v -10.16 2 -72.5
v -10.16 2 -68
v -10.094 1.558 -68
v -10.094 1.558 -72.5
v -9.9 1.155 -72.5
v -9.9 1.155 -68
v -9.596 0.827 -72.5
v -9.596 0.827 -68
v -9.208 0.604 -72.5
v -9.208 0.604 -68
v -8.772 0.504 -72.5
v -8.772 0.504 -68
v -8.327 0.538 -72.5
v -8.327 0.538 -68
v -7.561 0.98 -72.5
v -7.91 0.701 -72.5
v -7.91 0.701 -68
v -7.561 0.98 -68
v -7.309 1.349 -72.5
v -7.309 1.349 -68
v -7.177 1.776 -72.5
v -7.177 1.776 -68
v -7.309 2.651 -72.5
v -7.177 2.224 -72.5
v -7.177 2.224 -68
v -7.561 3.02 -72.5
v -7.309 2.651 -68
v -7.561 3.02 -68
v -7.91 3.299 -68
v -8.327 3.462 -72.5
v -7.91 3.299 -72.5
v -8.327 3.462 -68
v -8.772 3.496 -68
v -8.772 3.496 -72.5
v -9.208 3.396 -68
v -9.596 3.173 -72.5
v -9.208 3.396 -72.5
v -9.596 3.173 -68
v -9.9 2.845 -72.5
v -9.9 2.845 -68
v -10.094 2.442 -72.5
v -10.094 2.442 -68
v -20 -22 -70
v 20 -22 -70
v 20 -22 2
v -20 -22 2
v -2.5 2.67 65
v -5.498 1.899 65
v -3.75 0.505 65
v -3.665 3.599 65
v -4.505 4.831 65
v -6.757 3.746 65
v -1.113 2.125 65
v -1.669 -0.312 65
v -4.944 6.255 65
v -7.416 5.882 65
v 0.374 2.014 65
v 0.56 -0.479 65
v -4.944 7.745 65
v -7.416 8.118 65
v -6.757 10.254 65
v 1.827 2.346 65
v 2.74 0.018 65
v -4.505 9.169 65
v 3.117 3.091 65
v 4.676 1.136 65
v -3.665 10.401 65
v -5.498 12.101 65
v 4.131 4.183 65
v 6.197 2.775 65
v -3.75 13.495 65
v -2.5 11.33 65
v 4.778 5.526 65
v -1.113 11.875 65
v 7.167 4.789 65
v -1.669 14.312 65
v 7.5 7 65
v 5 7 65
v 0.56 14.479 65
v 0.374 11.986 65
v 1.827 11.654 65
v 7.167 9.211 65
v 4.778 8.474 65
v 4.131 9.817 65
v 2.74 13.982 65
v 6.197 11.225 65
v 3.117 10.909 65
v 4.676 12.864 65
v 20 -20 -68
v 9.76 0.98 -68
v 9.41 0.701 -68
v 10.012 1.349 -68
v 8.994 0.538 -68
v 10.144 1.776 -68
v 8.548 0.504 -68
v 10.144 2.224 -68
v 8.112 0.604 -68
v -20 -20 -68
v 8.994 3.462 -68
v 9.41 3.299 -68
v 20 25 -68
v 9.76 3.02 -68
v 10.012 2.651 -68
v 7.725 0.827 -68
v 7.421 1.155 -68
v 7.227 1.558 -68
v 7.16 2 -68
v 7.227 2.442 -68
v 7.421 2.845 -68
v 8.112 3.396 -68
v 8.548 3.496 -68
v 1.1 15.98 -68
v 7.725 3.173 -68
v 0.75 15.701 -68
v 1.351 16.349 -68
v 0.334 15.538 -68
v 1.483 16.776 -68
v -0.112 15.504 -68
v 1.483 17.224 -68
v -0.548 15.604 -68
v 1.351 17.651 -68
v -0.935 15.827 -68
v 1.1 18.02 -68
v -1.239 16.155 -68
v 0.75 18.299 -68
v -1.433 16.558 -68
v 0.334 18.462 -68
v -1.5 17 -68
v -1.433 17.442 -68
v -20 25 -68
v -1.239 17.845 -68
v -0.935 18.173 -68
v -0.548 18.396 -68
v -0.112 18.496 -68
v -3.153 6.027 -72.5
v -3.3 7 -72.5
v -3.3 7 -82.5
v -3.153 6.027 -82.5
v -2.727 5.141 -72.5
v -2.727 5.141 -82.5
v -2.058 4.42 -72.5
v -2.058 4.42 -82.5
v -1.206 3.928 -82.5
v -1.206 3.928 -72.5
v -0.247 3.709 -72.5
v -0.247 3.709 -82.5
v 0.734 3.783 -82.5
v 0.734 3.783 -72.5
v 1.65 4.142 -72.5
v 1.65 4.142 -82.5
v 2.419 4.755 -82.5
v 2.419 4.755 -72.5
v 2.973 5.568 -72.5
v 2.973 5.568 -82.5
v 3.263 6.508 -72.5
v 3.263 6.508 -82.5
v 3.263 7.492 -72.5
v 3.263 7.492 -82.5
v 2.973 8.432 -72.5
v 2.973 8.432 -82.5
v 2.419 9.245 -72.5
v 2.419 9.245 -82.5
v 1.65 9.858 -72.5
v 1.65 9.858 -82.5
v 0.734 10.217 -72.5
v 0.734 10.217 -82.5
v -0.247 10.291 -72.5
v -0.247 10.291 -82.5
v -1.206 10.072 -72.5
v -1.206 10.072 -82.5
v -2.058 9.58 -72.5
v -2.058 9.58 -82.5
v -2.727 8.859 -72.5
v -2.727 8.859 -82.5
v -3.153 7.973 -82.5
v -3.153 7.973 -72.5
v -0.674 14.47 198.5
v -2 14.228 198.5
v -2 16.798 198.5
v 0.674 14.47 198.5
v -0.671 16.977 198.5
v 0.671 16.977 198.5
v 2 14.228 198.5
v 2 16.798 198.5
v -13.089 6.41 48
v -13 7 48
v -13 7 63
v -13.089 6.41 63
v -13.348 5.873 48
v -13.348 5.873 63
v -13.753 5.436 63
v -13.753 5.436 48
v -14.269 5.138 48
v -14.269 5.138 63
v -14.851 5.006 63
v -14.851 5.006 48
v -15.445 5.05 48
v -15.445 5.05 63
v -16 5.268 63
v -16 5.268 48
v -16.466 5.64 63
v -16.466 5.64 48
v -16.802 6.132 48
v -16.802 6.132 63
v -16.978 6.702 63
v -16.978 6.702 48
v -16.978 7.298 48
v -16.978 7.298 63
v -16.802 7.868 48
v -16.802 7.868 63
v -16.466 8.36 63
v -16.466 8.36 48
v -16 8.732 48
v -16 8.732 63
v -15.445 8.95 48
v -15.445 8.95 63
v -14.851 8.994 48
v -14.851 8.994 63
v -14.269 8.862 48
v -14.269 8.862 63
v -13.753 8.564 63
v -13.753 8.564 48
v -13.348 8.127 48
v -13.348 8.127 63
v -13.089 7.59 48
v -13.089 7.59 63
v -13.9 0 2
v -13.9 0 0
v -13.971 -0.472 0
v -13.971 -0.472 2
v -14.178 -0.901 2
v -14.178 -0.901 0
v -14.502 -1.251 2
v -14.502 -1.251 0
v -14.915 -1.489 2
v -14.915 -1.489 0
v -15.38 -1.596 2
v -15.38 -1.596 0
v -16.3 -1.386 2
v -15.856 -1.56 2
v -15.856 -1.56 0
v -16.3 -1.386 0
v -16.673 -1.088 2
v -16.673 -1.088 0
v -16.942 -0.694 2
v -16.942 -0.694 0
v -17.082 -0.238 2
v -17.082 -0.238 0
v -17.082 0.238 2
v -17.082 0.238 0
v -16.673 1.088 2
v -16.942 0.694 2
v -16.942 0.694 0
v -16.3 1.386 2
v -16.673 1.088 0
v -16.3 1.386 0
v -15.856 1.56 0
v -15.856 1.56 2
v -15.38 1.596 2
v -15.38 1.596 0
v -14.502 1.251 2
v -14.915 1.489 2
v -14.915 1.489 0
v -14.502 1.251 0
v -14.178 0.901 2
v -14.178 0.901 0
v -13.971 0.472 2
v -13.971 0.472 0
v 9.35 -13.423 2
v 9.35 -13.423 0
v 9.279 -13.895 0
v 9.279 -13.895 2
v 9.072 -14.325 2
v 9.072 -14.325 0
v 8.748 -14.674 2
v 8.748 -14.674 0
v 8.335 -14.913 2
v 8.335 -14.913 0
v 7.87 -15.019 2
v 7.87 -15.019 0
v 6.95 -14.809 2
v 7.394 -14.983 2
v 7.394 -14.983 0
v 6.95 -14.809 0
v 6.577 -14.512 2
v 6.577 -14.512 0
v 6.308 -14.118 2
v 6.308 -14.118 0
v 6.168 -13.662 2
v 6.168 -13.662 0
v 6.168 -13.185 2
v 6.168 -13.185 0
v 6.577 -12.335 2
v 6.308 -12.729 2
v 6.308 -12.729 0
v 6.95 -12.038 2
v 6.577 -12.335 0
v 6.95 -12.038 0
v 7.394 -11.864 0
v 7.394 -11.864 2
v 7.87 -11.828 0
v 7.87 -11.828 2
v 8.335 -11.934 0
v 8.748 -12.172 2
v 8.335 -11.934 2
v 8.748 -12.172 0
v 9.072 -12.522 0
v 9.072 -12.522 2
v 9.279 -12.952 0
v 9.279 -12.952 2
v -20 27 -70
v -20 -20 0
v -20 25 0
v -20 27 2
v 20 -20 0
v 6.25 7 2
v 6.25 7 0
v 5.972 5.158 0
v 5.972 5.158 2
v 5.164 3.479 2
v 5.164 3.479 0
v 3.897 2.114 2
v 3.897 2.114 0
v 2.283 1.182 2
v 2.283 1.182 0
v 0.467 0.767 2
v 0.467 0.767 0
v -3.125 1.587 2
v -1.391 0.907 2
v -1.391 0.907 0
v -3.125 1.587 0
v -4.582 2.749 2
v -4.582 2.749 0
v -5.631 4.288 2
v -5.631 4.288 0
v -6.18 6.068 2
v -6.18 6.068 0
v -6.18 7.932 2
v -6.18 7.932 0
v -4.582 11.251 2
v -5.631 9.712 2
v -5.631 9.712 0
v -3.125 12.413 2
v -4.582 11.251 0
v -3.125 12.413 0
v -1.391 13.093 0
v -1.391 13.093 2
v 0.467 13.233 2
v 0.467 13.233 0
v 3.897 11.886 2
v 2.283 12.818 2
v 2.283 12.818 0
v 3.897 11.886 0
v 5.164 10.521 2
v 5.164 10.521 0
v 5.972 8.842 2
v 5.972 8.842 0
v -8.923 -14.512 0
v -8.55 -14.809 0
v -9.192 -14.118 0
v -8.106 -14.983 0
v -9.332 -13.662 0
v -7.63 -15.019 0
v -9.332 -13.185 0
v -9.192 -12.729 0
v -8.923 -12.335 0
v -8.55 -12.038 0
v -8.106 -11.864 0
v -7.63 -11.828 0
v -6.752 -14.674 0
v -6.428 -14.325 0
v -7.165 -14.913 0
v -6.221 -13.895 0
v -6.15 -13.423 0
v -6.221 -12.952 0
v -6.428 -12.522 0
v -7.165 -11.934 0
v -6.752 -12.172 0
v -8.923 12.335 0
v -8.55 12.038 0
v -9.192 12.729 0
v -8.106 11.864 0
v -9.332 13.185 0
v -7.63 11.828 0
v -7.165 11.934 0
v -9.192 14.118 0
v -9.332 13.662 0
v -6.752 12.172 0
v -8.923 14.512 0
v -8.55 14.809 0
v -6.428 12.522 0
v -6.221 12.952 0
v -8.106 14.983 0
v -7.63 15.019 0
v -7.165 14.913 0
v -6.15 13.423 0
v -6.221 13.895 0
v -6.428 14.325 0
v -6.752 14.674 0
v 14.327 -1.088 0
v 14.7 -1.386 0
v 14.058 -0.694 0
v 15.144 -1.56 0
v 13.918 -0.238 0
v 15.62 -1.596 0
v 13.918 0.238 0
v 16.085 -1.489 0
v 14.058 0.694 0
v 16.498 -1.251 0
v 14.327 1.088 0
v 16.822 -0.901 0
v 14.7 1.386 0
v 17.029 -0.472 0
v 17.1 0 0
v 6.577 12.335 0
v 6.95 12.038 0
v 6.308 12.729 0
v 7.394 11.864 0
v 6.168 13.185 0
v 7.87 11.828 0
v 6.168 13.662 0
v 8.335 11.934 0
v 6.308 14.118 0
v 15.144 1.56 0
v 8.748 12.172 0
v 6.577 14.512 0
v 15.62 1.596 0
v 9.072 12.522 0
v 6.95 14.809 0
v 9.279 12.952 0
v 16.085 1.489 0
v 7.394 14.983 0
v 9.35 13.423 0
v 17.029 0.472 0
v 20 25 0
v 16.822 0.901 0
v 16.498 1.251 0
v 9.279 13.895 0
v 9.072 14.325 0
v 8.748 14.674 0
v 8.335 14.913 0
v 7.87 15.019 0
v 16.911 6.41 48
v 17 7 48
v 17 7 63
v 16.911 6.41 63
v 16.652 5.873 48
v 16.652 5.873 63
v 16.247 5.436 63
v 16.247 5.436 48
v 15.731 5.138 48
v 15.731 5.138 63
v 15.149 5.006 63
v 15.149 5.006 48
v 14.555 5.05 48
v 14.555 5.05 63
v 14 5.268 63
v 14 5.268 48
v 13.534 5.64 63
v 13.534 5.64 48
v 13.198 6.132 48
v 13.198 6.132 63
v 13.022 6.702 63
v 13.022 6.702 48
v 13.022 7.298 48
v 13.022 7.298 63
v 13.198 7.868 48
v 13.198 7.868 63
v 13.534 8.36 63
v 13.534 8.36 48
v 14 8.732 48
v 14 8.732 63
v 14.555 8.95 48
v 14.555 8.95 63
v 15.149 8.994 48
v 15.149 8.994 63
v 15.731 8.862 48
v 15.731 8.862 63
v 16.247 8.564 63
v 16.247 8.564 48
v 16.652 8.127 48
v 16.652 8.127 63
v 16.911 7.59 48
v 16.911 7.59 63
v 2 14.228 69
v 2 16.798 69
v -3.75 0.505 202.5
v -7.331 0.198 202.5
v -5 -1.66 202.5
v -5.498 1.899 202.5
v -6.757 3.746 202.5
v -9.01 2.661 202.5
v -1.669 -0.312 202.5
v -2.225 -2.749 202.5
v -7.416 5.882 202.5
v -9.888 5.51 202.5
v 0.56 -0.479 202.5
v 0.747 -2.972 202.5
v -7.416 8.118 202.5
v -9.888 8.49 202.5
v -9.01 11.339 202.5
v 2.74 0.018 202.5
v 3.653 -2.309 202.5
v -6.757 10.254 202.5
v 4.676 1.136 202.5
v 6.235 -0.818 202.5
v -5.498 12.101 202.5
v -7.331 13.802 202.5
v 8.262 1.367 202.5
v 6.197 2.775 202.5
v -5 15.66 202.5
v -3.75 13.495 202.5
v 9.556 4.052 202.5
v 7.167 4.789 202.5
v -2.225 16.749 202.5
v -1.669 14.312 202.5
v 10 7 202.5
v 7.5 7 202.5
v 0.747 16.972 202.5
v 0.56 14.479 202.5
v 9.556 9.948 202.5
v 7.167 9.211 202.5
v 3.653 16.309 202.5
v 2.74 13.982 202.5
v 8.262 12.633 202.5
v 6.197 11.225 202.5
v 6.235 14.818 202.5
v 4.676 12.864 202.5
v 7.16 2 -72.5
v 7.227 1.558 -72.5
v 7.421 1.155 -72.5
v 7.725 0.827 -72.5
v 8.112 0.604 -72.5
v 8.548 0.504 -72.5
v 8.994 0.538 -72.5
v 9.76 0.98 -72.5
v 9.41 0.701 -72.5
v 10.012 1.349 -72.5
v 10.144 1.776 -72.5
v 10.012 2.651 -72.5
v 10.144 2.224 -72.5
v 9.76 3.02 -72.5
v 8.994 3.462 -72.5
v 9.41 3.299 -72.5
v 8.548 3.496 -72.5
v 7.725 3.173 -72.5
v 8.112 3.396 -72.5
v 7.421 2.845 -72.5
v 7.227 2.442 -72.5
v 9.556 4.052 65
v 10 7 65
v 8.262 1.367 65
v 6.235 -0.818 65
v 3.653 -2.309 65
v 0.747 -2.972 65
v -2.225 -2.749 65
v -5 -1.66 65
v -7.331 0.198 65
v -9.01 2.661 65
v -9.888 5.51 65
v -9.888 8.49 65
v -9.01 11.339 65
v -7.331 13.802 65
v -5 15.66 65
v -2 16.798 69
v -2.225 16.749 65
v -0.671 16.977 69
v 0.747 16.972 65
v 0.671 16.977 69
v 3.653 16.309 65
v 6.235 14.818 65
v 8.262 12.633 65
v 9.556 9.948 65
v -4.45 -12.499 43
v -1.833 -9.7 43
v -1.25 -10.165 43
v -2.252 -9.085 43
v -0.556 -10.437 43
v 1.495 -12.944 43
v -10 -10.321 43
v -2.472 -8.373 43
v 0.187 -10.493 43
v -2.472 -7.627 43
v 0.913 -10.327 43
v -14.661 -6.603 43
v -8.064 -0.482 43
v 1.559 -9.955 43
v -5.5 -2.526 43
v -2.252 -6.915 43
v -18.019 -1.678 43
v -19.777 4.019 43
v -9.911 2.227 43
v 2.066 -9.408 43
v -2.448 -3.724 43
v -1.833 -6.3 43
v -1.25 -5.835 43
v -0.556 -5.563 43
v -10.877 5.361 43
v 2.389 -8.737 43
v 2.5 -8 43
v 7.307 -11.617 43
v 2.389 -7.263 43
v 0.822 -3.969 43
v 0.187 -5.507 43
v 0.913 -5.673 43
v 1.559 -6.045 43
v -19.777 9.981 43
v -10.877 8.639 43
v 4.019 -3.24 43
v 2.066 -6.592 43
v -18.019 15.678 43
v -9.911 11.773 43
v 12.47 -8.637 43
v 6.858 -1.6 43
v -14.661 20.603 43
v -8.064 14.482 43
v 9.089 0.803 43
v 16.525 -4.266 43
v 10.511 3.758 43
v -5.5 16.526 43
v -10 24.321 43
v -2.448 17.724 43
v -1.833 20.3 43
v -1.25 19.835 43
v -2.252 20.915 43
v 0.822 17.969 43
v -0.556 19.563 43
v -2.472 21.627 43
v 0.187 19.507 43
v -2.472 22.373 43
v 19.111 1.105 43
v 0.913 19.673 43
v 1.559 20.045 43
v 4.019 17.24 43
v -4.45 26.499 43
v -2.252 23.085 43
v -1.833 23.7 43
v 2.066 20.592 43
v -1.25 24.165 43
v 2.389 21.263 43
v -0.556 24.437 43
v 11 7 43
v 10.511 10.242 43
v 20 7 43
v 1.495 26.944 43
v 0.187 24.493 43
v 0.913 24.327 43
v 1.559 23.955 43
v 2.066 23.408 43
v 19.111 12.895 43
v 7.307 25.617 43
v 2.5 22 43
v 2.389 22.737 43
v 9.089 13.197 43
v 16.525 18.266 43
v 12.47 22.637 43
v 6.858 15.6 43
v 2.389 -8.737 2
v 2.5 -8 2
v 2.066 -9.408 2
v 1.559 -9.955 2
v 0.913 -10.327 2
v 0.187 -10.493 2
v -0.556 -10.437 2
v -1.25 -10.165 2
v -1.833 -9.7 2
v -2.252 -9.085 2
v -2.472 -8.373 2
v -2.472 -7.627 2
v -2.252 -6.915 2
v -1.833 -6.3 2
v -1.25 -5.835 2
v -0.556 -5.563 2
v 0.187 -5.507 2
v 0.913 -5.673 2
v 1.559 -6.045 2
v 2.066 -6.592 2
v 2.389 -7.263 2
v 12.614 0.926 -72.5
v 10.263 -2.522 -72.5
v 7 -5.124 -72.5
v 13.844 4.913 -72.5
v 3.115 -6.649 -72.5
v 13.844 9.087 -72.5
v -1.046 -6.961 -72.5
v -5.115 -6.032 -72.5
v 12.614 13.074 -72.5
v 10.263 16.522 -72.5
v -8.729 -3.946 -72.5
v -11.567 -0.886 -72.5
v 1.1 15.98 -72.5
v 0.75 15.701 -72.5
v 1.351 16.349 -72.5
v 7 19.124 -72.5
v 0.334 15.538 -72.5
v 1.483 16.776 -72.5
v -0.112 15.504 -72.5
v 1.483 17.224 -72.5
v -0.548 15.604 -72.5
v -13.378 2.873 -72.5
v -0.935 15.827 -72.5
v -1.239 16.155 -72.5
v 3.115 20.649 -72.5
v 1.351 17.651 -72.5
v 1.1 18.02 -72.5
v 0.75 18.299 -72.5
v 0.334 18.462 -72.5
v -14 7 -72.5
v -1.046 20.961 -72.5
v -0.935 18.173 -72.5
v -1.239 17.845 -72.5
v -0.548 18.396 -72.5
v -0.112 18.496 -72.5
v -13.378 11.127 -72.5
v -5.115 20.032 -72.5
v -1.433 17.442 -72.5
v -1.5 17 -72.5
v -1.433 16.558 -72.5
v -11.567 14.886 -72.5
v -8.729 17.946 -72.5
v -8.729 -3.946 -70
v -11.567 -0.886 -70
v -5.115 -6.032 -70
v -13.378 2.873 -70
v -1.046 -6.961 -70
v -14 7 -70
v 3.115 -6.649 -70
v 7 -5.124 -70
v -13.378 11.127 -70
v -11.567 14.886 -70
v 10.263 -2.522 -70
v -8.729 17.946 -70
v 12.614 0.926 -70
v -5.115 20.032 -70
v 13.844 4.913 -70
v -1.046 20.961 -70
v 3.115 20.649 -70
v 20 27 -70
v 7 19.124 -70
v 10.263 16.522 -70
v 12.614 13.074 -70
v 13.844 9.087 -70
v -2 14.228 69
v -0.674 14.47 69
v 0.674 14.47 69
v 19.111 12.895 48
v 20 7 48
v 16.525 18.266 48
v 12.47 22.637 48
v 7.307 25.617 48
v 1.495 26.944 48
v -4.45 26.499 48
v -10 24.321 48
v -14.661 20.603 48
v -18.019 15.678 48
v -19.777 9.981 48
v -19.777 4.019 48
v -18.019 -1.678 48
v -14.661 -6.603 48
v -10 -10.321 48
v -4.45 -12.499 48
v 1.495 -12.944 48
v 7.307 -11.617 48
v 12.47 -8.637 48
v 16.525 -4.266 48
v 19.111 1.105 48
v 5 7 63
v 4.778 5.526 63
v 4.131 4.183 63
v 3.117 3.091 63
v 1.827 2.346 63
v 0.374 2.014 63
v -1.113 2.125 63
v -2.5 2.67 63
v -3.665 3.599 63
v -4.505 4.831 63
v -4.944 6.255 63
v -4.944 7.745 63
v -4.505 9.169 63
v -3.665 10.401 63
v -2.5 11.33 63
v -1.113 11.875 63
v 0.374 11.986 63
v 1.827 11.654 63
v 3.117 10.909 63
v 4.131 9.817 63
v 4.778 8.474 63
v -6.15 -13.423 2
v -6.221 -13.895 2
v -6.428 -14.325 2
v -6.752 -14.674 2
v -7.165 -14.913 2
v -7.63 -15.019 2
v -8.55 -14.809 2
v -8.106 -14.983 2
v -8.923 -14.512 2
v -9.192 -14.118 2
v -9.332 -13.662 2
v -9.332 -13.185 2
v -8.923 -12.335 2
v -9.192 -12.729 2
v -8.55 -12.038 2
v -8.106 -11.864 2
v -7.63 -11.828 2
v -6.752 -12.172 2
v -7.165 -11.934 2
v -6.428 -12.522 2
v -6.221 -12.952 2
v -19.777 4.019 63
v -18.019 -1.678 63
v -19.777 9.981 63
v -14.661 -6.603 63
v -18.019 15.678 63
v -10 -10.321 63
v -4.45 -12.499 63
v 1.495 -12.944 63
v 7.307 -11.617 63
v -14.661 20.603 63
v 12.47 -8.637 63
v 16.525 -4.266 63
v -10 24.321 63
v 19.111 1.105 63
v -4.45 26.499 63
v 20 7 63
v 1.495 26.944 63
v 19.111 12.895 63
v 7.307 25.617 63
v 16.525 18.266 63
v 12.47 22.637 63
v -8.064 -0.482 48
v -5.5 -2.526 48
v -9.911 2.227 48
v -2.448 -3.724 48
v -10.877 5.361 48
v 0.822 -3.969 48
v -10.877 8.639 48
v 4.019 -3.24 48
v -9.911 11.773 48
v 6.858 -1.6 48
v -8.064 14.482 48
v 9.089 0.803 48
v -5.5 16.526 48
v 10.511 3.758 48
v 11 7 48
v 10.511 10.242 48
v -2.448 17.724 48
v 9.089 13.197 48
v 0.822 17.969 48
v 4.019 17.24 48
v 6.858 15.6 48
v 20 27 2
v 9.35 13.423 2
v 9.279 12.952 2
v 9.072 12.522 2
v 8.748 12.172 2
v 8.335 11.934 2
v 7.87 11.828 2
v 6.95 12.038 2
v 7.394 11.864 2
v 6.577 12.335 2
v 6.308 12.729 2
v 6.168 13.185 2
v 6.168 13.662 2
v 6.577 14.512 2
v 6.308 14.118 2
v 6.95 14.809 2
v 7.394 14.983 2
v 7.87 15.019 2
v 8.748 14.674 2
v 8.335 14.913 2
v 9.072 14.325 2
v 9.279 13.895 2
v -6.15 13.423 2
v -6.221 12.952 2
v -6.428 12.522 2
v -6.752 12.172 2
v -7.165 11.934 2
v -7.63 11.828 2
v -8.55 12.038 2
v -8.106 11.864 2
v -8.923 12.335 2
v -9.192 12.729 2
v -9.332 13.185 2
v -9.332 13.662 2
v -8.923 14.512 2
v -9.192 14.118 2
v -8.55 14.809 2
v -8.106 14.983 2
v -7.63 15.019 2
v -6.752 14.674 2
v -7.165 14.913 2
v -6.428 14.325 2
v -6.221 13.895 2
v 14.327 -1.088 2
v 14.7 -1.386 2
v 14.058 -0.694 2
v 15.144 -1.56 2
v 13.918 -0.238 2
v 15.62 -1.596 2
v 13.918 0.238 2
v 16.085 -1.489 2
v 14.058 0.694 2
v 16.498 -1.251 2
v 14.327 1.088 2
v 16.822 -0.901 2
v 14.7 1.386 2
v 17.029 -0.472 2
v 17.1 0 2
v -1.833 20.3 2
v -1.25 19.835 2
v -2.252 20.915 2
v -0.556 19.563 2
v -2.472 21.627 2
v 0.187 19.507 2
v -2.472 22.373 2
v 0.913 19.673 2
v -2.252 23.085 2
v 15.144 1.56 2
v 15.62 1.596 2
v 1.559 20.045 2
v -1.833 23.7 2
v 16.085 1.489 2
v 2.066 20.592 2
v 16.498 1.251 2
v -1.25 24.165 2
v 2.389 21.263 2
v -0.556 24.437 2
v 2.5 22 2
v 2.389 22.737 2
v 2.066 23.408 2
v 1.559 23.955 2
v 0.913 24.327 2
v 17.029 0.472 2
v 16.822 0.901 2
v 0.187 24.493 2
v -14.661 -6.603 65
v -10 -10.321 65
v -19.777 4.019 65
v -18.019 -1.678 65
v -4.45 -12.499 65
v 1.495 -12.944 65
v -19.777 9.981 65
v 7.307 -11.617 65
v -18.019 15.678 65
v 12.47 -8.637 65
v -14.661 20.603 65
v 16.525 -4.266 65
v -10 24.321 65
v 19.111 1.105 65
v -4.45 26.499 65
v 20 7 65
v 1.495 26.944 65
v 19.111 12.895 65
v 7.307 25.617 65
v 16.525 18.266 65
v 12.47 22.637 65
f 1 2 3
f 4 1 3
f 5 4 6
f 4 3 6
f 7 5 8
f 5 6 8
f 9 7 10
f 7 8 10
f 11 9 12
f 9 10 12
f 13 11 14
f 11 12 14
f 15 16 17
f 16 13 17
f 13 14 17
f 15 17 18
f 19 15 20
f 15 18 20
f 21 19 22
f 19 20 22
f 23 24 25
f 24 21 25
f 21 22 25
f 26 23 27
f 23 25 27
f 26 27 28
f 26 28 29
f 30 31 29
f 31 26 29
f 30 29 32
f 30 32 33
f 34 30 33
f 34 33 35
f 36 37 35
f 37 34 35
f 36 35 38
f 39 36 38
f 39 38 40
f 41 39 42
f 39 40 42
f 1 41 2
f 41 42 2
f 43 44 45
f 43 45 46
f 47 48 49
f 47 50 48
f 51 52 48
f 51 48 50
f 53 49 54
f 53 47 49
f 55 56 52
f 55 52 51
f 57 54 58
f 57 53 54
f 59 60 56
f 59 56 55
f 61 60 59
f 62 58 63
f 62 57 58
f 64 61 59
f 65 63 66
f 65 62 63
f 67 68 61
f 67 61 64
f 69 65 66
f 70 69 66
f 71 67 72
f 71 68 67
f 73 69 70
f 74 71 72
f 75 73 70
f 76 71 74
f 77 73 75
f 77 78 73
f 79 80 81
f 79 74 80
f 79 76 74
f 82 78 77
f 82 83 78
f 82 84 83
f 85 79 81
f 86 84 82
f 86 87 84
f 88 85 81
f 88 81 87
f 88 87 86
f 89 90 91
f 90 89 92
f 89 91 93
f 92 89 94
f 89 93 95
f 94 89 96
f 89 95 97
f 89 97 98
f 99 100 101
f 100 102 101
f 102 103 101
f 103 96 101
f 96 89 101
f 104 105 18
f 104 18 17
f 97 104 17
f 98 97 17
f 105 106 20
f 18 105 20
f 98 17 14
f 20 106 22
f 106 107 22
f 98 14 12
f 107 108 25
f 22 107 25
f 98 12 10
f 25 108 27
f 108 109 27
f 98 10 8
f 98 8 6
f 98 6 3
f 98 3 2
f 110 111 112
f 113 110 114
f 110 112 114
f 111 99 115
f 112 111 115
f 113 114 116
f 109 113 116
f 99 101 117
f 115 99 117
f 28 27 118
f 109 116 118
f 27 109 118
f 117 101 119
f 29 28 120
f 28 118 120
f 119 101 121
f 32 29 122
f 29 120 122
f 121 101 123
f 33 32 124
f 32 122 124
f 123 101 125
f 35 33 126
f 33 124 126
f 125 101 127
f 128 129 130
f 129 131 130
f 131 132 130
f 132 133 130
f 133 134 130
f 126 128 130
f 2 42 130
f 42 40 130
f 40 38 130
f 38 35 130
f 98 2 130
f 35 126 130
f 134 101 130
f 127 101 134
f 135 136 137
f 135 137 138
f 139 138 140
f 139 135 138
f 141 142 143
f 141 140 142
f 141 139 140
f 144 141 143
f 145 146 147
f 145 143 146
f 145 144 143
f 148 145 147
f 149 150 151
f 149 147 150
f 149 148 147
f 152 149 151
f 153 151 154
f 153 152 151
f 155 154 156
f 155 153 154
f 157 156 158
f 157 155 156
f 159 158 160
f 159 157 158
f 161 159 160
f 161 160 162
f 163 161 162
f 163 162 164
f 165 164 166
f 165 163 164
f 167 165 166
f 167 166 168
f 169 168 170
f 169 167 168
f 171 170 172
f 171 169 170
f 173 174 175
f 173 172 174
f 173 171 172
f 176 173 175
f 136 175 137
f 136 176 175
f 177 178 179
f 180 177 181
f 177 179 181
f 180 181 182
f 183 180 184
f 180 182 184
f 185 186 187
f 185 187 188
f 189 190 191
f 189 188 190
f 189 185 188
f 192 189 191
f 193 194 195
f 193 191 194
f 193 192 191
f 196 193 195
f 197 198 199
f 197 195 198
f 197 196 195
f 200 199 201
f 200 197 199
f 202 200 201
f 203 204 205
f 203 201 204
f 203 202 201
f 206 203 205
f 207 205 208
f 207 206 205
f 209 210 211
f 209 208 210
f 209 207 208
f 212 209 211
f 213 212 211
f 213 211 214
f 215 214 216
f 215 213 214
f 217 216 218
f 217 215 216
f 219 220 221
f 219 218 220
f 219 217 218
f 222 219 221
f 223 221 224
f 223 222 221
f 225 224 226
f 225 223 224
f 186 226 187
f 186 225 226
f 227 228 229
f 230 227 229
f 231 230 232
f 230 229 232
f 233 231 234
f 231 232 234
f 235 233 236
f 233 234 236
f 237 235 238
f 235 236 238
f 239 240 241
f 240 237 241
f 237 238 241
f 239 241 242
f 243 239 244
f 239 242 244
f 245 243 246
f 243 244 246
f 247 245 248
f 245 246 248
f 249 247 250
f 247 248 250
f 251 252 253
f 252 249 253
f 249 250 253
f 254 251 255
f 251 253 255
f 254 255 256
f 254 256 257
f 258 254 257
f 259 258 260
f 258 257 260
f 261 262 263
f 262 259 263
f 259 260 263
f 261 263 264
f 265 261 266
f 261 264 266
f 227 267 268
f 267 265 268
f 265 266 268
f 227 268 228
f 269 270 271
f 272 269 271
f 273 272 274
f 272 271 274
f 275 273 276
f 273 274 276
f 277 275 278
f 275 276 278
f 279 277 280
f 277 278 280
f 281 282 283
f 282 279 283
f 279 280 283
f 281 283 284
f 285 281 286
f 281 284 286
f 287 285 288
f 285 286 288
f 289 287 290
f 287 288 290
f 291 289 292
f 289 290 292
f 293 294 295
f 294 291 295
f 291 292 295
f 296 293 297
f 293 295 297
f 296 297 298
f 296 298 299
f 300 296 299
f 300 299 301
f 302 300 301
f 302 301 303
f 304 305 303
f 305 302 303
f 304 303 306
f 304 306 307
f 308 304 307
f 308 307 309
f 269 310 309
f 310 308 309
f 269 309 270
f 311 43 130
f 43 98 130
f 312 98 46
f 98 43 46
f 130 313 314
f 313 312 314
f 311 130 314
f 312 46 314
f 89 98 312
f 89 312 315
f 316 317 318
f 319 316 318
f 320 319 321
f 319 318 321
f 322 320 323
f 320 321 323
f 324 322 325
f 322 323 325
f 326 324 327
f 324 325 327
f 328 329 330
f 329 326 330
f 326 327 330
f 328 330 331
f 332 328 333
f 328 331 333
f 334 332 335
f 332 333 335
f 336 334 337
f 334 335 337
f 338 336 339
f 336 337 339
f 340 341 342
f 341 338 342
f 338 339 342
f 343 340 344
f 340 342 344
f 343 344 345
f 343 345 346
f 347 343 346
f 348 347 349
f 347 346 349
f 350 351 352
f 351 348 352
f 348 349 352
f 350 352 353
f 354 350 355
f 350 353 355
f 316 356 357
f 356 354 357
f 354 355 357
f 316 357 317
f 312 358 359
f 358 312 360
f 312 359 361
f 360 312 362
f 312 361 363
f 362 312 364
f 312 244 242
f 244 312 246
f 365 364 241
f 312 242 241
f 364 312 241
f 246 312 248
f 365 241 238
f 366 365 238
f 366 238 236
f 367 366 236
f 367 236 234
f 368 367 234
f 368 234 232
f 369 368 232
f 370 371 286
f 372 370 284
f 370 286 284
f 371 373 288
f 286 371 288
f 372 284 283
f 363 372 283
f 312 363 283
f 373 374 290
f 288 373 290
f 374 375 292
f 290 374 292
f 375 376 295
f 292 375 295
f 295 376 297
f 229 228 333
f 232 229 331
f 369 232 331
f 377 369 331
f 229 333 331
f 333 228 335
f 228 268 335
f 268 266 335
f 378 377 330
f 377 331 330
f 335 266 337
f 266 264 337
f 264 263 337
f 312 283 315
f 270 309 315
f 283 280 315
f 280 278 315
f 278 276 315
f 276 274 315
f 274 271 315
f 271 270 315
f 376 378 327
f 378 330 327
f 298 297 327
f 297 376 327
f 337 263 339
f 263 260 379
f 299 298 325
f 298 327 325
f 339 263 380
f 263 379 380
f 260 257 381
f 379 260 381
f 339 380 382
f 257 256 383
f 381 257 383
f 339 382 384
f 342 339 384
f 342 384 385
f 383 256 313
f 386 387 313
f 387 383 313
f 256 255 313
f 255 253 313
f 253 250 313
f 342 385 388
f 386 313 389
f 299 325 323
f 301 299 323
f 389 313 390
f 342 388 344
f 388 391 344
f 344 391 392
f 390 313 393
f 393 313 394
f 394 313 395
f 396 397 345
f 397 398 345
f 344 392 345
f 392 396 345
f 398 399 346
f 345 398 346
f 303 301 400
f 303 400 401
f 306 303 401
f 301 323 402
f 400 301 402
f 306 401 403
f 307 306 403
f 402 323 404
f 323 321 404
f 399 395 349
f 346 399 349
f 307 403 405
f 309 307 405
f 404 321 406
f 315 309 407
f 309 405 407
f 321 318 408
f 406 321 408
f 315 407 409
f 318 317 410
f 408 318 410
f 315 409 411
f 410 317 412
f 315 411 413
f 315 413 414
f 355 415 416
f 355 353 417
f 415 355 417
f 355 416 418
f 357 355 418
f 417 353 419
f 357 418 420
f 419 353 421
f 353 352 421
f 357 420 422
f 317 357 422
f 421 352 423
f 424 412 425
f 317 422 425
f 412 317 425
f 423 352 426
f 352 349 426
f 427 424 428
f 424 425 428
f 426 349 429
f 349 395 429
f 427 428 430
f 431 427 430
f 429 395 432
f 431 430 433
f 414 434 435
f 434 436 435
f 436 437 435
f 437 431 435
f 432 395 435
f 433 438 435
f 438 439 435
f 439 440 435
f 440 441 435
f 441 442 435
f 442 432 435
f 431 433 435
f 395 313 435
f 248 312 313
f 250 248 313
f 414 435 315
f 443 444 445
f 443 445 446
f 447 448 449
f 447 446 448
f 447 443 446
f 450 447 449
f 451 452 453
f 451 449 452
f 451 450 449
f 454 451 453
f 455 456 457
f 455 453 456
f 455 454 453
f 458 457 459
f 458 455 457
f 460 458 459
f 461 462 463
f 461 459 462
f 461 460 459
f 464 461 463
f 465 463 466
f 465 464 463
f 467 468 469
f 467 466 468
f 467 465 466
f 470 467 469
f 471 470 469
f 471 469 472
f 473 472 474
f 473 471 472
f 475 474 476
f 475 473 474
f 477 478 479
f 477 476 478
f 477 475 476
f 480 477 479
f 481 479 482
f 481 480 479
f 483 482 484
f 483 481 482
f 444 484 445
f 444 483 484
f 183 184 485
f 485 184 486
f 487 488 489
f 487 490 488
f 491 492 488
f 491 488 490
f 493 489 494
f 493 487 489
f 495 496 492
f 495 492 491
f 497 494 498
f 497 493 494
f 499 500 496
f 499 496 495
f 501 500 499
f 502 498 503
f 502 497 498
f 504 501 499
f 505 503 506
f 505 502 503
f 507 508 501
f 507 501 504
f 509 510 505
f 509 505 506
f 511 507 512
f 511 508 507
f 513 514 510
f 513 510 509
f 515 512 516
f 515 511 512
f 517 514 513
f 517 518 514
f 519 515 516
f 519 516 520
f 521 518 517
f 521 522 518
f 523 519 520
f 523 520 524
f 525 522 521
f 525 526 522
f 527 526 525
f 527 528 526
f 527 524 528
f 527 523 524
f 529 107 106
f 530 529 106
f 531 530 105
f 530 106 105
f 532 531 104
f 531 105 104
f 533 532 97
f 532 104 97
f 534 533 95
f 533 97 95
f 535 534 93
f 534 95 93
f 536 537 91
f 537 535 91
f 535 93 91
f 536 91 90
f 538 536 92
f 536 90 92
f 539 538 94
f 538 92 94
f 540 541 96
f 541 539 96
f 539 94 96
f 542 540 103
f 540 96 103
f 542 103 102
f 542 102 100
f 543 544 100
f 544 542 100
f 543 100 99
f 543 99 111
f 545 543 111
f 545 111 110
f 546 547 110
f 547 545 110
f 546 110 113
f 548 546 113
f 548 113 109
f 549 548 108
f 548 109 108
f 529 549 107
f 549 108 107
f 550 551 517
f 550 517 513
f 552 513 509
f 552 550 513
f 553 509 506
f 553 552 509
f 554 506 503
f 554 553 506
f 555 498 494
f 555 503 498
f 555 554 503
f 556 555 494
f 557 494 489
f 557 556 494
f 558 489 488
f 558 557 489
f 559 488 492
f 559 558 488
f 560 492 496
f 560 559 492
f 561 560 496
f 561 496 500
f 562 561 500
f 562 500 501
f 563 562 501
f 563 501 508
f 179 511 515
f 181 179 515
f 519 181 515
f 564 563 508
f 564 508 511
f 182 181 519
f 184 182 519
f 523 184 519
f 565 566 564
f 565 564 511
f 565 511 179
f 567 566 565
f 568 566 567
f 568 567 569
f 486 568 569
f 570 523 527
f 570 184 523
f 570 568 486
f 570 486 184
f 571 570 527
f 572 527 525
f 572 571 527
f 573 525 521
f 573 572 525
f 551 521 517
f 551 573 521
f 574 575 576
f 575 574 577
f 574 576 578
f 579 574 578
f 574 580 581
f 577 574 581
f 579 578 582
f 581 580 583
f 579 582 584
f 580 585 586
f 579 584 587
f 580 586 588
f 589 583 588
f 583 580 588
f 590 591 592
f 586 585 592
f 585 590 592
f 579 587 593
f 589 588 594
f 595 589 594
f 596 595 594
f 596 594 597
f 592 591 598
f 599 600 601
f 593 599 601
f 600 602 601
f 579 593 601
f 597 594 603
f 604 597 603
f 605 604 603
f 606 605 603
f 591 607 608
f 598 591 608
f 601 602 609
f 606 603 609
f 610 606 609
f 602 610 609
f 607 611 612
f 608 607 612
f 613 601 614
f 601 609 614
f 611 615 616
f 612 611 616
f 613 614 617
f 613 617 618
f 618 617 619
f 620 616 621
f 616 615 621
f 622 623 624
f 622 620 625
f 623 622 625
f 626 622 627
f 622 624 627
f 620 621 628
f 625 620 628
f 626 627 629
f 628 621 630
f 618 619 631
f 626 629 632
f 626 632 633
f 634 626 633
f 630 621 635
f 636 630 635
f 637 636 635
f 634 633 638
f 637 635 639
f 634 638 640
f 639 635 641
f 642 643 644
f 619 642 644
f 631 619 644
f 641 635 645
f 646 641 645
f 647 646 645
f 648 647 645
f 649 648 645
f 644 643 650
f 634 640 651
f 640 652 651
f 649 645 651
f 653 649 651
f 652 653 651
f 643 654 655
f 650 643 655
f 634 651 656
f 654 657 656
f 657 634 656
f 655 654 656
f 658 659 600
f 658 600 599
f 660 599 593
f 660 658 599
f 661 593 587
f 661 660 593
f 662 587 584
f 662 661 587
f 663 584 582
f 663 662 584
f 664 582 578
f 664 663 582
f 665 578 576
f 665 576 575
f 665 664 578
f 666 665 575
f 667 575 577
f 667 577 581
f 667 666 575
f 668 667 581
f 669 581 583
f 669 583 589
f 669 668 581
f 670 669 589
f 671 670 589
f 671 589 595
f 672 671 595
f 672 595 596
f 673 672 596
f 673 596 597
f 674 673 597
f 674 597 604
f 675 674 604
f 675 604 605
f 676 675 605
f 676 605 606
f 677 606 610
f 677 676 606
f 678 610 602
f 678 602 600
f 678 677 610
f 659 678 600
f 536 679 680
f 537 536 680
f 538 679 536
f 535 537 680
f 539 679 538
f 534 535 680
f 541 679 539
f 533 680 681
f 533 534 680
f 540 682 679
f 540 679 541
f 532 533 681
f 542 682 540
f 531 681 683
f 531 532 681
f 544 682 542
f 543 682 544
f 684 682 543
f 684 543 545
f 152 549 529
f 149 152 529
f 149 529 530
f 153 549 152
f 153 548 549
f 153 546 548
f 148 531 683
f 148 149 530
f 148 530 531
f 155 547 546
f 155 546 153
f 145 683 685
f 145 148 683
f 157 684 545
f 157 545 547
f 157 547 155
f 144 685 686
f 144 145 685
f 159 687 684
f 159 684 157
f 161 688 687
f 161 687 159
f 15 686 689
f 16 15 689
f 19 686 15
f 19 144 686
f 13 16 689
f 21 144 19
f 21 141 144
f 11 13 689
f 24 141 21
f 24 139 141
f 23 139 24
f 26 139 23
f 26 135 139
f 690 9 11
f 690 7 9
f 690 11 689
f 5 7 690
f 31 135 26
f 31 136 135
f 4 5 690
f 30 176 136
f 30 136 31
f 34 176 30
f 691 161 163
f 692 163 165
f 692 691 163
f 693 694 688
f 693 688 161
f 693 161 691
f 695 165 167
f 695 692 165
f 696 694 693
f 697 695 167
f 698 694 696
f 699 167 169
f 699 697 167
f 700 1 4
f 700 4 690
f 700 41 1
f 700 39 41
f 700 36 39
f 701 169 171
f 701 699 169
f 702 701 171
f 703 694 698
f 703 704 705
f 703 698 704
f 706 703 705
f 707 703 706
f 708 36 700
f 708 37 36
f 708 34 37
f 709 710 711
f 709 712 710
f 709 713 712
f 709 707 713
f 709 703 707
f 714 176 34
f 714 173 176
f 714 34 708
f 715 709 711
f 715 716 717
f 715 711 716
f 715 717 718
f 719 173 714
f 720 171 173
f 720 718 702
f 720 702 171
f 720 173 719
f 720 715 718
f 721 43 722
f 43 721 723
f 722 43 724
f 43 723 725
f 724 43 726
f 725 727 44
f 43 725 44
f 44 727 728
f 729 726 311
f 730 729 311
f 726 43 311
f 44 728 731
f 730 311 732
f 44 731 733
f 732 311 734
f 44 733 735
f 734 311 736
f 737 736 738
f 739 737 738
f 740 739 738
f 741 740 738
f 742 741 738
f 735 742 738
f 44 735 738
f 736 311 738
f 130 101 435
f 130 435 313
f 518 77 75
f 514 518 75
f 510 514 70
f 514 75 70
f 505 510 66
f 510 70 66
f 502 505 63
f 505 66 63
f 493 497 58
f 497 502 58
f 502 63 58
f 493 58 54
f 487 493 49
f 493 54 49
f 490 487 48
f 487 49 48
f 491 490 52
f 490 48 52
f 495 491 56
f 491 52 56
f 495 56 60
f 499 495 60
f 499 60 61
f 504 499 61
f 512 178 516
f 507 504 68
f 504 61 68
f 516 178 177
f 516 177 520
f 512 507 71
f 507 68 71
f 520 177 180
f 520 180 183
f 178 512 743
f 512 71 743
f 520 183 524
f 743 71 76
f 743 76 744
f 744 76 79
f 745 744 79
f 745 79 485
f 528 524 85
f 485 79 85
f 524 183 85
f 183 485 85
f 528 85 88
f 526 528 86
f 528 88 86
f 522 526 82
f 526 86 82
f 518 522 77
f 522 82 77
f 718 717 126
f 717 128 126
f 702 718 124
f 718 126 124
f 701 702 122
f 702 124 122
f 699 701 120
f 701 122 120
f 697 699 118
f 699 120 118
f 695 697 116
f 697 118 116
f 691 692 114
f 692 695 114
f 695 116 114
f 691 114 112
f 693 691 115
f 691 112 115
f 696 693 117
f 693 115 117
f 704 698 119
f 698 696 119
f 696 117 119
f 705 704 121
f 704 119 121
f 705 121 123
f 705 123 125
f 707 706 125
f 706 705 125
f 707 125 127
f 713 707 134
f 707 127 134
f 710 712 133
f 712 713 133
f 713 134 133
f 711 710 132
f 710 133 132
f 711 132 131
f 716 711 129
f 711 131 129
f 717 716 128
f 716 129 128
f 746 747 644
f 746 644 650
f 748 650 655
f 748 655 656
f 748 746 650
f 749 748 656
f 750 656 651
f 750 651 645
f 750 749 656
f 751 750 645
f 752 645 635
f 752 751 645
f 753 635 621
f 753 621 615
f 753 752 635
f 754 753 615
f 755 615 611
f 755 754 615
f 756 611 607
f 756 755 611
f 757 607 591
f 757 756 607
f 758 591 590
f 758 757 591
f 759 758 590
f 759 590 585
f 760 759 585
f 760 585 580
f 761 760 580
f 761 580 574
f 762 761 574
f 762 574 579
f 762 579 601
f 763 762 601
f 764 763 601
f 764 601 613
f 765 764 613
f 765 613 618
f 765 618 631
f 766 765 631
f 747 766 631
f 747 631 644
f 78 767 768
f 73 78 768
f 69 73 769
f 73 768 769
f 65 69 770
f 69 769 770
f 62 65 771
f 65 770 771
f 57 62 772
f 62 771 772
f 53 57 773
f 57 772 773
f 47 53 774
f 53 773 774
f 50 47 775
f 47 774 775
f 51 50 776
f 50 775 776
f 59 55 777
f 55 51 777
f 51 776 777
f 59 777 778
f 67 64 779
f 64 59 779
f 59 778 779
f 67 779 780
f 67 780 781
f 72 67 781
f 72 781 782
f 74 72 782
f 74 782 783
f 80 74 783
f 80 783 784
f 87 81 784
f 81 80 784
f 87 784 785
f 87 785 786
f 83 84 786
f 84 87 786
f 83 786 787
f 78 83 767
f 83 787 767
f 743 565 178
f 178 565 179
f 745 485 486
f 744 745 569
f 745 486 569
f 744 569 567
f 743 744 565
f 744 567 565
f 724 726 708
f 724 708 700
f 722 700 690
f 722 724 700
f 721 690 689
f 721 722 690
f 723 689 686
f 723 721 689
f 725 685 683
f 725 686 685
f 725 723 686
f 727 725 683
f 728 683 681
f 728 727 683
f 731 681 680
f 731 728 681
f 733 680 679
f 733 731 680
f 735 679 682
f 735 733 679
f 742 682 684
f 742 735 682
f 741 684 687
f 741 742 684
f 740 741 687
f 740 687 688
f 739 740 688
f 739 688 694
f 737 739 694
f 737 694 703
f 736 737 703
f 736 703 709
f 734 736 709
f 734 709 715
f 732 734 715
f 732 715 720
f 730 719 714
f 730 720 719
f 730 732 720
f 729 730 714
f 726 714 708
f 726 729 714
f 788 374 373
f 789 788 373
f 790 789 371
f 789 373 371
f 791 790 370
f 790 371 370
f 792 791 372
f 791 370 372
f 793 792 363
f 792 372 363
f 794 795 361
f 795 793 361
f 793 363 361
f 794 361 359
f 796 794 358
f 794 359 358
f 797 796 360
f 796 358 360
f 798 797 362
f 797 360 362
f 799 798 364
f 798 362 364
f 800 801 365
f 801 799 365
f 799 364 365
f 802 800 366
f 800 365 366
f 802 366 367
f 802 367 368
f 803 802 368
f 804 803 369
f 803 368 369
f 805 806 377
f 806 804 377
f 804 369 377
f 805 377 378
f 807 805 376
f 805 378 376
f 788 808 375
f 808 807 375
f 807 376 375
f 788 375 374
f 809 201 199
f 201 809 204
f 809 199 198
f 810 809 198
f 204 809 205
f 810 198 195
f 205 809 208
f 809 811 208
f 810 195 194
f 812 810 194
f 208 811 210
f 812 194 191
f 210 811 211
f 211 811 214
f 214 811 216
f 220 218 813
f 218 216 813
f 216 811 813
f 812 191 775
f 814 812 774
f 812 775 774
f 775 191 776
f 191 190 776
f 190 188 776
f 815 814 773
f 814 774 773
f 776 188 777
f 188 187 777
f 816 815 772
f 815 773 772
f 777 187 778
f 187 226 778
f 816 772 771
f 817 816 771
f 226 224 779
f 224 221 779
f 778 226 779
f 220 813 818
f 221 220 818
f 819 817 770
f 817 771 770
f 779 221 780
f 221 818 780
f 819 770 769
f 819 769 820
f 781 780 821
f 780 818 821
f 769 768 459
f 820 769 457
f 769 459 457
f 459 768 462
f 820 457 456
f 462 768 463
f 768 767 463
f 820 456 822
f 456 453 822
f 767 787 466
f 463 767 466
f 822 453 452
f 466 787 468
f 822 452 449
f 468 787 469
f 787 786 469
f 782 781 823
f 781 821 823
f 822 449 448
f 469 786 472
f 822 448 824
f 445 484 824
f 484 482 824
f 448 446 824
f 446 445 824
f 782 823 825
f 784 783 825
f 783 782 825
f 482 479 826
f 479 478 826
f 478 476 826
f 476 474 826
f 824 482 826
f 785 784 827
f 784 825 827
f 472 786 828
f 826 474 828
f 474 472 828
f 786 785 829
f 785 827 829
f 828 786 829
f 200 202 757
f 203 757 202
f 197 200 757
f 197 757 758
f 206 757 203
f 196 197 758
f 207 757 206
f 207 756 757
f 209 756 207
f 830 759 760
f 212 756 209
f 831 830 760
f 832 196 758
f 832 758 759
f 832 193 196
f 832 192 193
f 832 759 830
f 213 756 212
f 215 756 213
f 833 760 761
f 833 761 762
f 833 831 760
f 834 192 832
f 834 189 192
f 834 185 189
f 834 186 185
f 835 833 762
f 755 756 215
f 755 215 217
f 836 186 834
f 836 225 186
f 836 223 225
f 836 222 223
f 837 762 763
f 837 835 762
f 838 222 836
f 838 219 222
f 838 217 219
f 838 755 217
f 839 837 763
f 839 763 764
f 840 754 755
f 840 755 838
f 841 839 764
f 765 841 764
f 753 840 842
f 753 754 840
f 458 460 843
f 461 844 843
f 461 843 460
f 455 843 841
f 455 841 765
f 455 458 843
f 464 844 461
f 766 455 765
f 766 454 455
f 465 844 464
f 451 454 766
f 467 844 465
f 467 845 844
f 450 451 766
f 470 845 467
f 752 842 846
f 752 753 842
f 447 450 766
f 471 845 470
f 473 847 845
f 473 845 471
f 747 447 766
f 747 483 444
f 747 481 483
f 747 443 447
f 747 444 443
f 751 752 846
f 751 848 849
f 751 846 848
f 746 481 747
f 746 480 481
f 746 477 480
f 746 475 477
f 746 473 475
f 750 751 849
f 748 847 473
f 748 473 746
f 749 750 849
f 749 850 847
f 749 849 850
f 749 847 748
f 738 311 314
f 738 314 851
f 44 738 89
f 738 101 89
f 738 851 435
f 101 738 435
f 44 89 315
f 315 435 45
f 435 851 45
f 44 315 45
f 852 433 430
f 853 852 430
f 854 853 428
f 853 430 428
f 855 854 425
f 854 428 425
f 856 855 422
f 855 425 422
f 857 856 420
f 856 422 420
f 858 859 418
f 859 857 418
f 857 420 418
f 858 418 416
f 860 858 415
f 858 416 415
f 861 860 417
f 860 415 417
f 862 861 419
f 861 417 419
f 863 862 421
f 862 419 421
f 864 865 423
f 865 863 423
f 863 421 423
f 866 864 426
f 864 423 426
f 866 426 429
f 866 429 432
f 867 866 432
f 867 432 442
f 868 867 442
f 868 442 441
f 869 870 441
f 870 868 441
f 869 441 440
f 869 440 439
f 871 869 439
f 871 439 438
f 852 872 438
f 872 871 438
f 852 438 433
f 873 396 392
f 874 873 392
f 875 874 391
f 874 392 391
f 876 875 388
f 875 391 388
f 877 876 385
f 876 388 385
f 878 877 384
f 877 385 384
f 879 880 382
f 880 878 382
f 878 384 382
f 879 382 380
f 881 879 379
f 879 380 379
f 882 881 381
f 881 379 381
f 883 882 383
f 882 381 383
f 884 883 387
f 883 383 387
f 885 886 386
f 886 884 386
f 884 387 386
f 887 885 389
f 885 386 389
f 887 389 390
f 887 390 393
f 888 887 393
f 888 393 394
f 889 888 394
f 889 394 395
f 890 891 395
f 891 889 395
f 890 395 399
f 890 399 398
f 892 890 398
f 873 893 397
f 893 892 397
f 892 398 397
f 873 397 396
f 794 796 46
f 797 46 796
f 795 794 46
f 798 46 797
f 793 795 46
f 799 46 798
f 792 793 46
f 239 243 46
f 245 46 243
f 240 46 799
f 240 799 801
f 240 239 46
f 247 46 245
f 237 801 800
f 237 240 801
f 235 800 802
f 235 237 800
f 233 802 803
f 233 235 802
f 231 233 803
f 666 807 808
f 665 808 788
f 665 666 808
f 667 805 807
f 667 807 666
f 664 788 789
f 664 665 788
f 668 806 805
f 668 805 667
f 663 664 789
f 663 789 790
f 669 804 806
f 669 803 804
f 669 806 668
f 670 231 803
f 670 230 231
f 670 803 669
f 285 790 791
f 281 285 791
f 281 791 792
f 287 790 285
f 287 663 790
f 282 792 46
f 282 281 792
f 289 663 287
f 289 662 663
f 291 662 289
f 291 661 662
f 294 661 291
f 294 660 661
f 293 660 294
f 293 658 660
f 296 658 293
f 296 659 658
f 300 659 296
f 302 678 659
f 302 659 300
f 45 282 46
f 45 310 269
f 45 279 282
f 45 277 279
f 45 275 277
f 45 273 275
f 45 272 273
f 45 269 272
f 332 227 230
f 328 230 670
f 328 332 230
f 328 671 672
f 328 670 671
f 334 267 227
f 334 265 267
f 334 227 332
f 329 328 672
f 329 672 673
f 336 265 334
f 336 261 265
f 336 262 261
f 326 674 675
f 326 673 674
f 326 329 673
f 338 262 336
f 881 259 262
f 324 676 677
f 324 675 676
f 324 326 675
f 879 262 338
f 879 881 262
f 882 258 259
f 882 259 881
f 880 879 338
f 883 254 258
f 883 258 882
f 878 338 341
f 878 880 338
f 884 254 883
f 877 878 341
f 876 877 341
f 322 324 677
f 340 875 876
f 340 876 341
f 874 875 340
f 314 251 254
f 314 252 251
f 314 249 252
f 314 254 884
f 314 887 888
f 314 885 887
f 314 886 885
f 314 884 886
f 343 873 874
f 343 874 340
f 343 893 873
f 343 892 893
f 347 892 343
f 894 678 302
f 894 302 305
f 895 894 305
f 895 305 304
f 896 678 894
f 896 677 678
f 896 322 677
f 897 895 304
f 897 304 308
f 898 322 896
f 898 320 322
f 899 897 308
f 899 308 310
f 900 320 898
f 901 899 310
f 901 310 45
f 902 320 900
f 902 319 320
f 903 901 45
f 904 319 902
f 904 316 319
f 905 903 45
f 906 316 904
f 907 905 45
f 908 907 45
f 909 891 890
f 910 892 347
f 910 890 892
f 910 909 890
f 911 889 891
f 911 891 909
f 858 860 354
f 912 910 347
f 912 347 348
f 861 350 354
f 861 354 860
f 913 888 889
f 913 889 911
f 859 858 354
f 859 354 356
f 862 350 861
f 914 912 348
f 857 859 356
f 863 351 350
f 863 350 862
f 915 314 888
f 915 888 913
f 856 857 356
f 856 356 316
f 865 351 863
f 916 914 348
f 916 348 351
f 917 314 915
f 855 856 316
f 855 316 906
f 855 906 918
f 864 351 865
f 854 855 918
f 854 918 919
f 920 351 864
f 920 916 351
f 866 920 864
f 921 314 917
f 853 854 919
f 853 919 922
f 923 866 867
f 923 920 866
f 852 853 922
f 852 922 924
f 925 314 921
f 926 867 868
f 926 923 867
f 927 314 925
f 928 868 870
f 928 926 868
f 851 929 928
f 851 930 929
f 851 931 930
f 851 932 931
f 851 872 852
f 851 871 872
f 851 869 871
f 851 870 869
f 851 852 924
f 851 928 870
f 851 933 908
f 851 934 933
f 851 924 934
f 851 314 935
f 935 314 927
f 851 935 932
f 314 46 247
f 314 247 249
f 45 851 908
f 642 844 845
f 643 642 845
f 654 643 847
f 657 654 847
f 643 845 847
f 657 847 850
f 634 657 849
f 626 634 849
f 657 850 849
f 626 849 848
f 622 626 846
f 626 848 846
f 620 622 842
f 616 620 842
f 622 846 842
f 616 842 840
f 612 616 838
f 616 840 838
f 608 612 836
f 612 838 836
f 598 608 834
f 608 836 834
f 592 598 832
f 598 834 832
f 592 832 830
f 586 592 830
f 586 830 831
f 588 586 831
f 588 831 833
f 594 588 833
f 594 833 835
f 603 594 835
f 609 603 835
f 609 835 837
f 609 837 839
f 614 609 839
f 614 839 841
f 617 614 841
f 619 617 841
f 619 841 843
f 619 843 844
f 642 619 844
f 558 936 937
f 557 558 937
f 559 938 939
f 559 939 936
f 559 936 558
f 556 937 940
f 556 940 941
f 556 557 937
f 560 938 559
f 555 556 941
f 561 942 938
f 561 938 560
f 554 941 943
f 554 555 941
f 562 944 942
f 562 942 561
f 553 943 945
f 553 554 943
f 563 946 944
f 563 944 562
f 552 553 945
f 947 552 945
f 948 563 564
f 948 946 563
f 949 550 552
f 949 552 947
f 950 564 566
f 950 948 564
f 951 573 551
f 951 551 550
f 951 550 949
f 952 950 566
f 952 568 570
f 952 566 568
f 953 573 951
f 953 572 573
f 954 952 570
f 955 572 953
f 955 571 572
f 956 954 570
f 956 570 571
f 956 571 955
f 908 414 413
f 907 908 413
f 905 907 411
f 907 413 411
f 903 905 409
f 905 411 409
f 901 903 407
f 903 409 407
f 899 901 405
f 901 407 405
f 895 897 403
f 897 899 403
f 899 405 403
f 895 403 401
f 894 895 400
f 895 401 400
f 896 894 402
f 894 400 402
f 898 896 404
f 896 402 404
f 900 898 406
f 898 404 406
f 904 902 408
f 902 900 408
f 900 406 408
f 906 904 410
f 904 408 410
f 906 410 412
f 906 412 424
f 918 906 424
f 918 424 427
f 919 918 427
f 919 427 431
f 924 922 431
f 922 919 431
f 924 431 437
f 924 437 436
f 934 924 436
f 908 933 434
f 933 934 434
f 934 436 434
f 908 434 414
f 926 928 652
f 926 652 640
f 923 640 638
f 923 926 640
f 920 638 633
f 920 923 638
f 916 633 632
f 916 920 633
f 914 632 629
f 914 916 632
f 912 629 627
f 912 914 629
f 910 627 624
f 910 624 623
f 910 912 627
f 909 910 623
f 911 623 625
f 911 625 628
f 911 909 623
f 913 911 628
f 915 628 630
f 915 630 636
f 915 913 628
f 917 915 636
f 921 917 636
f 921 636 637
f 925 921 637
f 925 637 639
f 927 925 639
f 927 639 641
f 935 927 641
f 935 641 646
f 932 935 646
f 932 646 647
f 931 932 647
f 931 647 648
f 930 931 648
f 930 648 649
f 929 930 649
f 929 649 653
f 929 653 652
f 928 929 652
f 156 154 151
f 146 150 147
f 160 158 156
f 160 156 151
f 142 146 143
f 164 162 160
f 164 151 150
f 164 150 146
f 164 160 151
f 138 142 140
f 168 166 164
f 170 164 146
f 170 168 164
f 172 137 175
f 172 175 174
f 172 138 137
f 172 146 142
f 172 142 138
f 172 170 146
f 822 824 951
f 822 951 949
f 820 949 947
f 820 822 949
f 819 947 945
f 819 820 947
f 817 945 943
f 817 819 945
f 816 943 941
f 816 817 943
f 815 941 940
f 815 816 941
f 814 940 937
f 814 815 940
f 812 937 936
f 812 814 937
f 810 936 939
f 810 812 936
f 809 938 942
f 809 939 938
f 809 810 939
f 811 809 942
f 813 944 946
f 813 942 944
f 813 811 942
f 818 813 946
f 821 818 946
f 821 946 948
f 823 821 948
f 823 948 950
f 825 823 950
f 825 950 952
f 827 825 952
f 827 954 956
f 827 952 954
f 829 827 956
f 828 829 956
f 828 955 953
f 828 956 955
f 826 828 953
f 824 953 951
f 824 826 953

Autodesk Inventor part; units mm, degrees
ref_plane "YZ Plane" through (0, 0, 0) normal (1, 0, 0) x (0, 1, 0)
ref_plane "XZ Plane" through (0, 0, 0) normal (0, 1, 0) x (-1, 0, 0)
sketch "Sketch1" plane through (0, 0, 0) normal (0, 0, 1) x (1, 0, 0)
  circle A0 centre (0, 0) radius 18.5 projected
  arc A1 (-8.9075, 7.6329) -> (8.9075, 7.6329) centre (0, 7) ccw projected
  spline S0 degree 3 poles (8.9075, 7.6329) (8.9044, 7.6769) (8.9082, 7.7215) (8.9387, 7.8037) (8.9677, 7.8415) (9.0503, 7.8747) (9.0975, 7.8677) (9.1766, 7.8302) (9.2105, 7.8009) (9.2388, 7.7672) knots 0 0 0 0 0.25 0.25 0.5 0.5 0.75 0.75 1 1 1 1 projected
  arc A2 (-9.2388, 7.7672) -> (9.2388, 7.7672) centre (0, 0) ccw projected
  spline S1 degree 3 poles (-9.2388, 7.7672) (-9.2105, 7.801) (-9.1766, 7.8302) (-9.0974, 7.8677) (-9.0502, 7.8747) (-8.9678, 7.8415) (-8.9387, 7.8036) (-8.9082, 7.7215) (-8.9044, 7.6769) (-8.9075, 7.6329) knots 0 0 0 0 0.25 0.25 0.5 0.5 0.75 0.75 1 1 1 1 projected
  circle A3 centre (7.75, -13.4234) radius 1.6 projected
  circle A4 centre (-7.75, -13.4234) radius 1.6 projected
  circle A5 centre (-15.5, 0) radius 1.6 projected
  circle A6 centre (-7.75, 13.4234) radius 1.6 projected
  circle A7 centre (7.75, 13.4234) radius 1.6 projected
  circle A8 centre (15.5, 0) radius 1.6 projected
  circle A9 centre (13.4234, 7.75) radius 2.1 projected
  circle A10 centre (-13.4234, 7.75) radius 2.1 projected
  circle A11 centre (0, -15.5) radius 2.1 projected
  circle A12 centre (0, 7) radius 6.25 projected
  line L0 (20, -25) -> (-20, -25)
  line L1 (-20, -25) -> (-20, 25)
  line L2 (-20, 25) -> (20, 25)
  line L3 (20, 25) -> (20, -25)
  line L4 (20, -25) -> (-20, 25) construction
  line L5 (-20, -25) -> (20, 25) construction
  dimension "d0" = 40
  dimension "d1" = 50
extrude "Extrusion1" add sketch "Sketch1" along normal blind 2 contours A0 | A1 S0 A2 S1 | A9 | A10 | A11 | L0 L1 L2 L3
sketch "Sketch2" plane through (0, 0, 2) normal (0, 0, 1) x (1, 0, 0)
  line L0 (-20, -25) -> (20, -25) projected
  line L1 (20, -25) -> (-20, -25)
  line L2 (-20, -25) -> (-20, -27)
  line L3 (-20, -27) -> (20, -27)
  line L4 (20, -27) -> (20, -25)
  line L5 (20, 25) -> (-20, 25) projected
  line L6 (20, 25) -> (-20, 25)
  line L7 (-20, 25) -> (-20, 27)
  line L8 (-20, 27) -> (20, 27)
  line L9 (20, 27) -> (20, 25)
  point P0 (0, 0)
  dimension "d4" = 2
  dimension "d19" = 2
extrude "Extrusion2" add sketch "Sketch2" against normal blind 70
sketch "Sketch5" plane through (0, 0, -68) normal (0, 0, -1) x (-1, 0, 0)
  line L0 (-20, -27) -> (20, -27)
  line L1 (20, -27) -> (20, 27)
  line L2 (20, 27) -> (-20, 27)
  line L3 (-20, 27) -> (-20, -27)
  circle A0 centre (0, 7) radius 6 construction
  circle A1 centre (0, 7) radius 3 construction
  circle A2 centre (0, 17) radius 1.5
  circle A3 centre (-8.6603, 2) radius 1.5
  circle A4 centre (8.6603, 2) radius 1.5
  point P0 (0, 0)
  dimension "d20" = 10
  dimension "d21" = 3
  dimension "d24" = 360
extrude "Extrusion4" add sketch "Sketch5" along normal blind 2
sketch "Sketch6" plane through (0, 0, 2) normal (0, 0, 1) x (1, 0, 0)
  line L0 (20, -27) -> (20, 27) projected
  line L1 (-20, -27) -> (20, -27)
  line L2 (20, -27) -> (20, -20)
  line L3 (20, -20) -> (-20, -20)
  line L4 (-20, -20) -> (-20, -27)
  circle A0 centre (0, 0) radius 18.5 projected
  point P0 (0, 0)
  dimension "d28" = 7
extrude "Extrusion5" cut sketch "Sketch6" against normal up to surface (72 mm away) contours L1 L4 L3 L0
sketch "Sketch7" plane through (0, 0, 2) normal (0, 0, 1) x (1, 0, 0)
  line L0 (-20, 27) -> (-20, -20) projected
  line L1 (20, -20) -> (20, 27) projected
  line L2 (-20, -20) -> (20, -20)
  line L3 (20, -20) -> (20, -22)
  line L4 (20, -22) -> (-20, -22)
  line L5 (-20, -22) -> (-20, -20)
  point P0 (0, 0)
  dimension "d31" = 2
extrude "Extrusion6" add sketch "Sketch7" against normal up to surface (72 mm away)
sketch "Sketch8" plane through (0, 0, 2) normal (0, 0, 1) x (1, 0, 0)
  circle A0 centre (0, 22) radius 2.5
  circle A1 centre (0, -8) radius 2.5
  point P0 (0, 0)
  dimension "d34" = 22
  dimension "d35" = 5
  dimension "d36" = 8
extrude "Extrusion7" add sketch "Sketch8" along normal blind 46
sketch "Sketch11" plane through (0, 22, 48) normal (0, 0, 1) x (1, 0, 0)
  circle A0 centre (0, -15) radius 8 construction
  circle A1 centre (0, -15) radius 20
  circle A2 centre (0, -15) radius 11
  point P0 (0, -22)
  dimension "d44" = 40
  dimension "d45" = 22
extrude "Extrusion9" add sketch "Sketch11" against normal blind 5
sketch "Sketch14" plane through (0, 7, 48) normal (0, 0, 1) x (1, 0, 0)
  circle A0 centre (-15, 0) radius 2
  circle A1 centre (0, 0) radius 6.282 construction
  circle A2 centre (15, 0) radius 2
  point P0 (0, -7)
  dimension "d60" = 15
  dimension "d61" = 4
  dimension "d64" = 360
extrude "Extrusion12" add sketch "Sketch14" along normal blind 15
sketch "Sketch15" plane through (-15, 7, 63) normal (0, 0, 1) x (1, 0, 0)
  circle A0 centre (15, 0) radius 4 construction
  circle A1 centre (15, 0) radius 11 construction
  circle A2 centre (15, 0) radius 20
  circle A3 centre (15, 0) radius 20 projected
  circle A4 centre (15, 0) radius 5
  point P0 (15, -7)
  dimension "d68" = 40
  dimension "d69" = 10
extrude "Extrusion13" add sketch "Sketch15" along normal blind 2
sketch "Sketch16" plane through (0, 7, 65) normal (0, 0, 1) x (1, 0, 0)
  circle A0 centre (0, 0) radius 5 construction
  circle A1 centre (0, 0) radius 7.5
  circle A2 centre (0, 0) radius 11 construction
  circle A3 centre (0, 0) radius 10
  point P0 (0, -7)
  dimension "d72" = 15
  dimension "d73" = 20
extrude "Extrusion14" add sketch "Sketch16" along normal blind 137.5
ref_plane "Work Plane1" through (0, 17, 65) normal (0, 1, 0) x (-1, 0, 0)
sketch "Sketch17" plane through (0, 17, 65) normal (0, 1, 0) x (-1, 0, 0)
  line L0 (2, 133.5) -> (-2, 133.5)
  line L1 (-2, 133.5) -> (-2, 4)
  line L2 (-2, 4) -> (2, 4)
  line L3 (2, 4) -> (2, 133.5)
  line L4 (-10, 0) -> (-10, 137.5) projected
  line L5 (10, 0) -> (10, 137.5) projected
  line L6 (10, 137.5) -> (-10, 137.5) projected
  line L7 (-10, 0) -> (10, 0) projected
  point P0 (0, -65)
  dimension "d76" = 4
  dimension "d77" = 4
  dimension "d78" = 8
  dimension "d79" = 8
extrude "Extrusion15" cut sketch "Sketch17" against normal up to surface contours L3 L2 L1 L0
sketch "Sketch18" plane through (0, 0, -70) normal (0, 0, -1) x (-1, 0, 0)
  circle A0 centre (0, 7) radius 6 construction
  circle A1 centre (0, 7) radius 14
  circle A2 centre (0, 17) radius 1.5 projected
  circle A3 centre (-8.6603, 2) radius 1.5 projected
  circle A4 centre (8.6603, 2) radius 1.5 projected
  point P0 (0, 0)
  dimension "d82" = 28
extrude "Extrusion16" add sketch "Sketch18" along normal blind 2.5
sketch "Sketch19" plane through (0, 7, -72.5) normal (0, 0, -1) x (-1, 0, 0)
  circle A0 centre (0, 0) radius 14 construction
  circle A1 centre (0, 0) radius 3.3
  point P0 (0, -7)
  point P1 (-1.4736, 13.9222)
  point P2 (1.4736, 13.9222)
  dimension "d85" = 6.6
extrude "Extrusion17" add sketch "Sketch19" along normal blind 10
properties part number "motor bracket"
